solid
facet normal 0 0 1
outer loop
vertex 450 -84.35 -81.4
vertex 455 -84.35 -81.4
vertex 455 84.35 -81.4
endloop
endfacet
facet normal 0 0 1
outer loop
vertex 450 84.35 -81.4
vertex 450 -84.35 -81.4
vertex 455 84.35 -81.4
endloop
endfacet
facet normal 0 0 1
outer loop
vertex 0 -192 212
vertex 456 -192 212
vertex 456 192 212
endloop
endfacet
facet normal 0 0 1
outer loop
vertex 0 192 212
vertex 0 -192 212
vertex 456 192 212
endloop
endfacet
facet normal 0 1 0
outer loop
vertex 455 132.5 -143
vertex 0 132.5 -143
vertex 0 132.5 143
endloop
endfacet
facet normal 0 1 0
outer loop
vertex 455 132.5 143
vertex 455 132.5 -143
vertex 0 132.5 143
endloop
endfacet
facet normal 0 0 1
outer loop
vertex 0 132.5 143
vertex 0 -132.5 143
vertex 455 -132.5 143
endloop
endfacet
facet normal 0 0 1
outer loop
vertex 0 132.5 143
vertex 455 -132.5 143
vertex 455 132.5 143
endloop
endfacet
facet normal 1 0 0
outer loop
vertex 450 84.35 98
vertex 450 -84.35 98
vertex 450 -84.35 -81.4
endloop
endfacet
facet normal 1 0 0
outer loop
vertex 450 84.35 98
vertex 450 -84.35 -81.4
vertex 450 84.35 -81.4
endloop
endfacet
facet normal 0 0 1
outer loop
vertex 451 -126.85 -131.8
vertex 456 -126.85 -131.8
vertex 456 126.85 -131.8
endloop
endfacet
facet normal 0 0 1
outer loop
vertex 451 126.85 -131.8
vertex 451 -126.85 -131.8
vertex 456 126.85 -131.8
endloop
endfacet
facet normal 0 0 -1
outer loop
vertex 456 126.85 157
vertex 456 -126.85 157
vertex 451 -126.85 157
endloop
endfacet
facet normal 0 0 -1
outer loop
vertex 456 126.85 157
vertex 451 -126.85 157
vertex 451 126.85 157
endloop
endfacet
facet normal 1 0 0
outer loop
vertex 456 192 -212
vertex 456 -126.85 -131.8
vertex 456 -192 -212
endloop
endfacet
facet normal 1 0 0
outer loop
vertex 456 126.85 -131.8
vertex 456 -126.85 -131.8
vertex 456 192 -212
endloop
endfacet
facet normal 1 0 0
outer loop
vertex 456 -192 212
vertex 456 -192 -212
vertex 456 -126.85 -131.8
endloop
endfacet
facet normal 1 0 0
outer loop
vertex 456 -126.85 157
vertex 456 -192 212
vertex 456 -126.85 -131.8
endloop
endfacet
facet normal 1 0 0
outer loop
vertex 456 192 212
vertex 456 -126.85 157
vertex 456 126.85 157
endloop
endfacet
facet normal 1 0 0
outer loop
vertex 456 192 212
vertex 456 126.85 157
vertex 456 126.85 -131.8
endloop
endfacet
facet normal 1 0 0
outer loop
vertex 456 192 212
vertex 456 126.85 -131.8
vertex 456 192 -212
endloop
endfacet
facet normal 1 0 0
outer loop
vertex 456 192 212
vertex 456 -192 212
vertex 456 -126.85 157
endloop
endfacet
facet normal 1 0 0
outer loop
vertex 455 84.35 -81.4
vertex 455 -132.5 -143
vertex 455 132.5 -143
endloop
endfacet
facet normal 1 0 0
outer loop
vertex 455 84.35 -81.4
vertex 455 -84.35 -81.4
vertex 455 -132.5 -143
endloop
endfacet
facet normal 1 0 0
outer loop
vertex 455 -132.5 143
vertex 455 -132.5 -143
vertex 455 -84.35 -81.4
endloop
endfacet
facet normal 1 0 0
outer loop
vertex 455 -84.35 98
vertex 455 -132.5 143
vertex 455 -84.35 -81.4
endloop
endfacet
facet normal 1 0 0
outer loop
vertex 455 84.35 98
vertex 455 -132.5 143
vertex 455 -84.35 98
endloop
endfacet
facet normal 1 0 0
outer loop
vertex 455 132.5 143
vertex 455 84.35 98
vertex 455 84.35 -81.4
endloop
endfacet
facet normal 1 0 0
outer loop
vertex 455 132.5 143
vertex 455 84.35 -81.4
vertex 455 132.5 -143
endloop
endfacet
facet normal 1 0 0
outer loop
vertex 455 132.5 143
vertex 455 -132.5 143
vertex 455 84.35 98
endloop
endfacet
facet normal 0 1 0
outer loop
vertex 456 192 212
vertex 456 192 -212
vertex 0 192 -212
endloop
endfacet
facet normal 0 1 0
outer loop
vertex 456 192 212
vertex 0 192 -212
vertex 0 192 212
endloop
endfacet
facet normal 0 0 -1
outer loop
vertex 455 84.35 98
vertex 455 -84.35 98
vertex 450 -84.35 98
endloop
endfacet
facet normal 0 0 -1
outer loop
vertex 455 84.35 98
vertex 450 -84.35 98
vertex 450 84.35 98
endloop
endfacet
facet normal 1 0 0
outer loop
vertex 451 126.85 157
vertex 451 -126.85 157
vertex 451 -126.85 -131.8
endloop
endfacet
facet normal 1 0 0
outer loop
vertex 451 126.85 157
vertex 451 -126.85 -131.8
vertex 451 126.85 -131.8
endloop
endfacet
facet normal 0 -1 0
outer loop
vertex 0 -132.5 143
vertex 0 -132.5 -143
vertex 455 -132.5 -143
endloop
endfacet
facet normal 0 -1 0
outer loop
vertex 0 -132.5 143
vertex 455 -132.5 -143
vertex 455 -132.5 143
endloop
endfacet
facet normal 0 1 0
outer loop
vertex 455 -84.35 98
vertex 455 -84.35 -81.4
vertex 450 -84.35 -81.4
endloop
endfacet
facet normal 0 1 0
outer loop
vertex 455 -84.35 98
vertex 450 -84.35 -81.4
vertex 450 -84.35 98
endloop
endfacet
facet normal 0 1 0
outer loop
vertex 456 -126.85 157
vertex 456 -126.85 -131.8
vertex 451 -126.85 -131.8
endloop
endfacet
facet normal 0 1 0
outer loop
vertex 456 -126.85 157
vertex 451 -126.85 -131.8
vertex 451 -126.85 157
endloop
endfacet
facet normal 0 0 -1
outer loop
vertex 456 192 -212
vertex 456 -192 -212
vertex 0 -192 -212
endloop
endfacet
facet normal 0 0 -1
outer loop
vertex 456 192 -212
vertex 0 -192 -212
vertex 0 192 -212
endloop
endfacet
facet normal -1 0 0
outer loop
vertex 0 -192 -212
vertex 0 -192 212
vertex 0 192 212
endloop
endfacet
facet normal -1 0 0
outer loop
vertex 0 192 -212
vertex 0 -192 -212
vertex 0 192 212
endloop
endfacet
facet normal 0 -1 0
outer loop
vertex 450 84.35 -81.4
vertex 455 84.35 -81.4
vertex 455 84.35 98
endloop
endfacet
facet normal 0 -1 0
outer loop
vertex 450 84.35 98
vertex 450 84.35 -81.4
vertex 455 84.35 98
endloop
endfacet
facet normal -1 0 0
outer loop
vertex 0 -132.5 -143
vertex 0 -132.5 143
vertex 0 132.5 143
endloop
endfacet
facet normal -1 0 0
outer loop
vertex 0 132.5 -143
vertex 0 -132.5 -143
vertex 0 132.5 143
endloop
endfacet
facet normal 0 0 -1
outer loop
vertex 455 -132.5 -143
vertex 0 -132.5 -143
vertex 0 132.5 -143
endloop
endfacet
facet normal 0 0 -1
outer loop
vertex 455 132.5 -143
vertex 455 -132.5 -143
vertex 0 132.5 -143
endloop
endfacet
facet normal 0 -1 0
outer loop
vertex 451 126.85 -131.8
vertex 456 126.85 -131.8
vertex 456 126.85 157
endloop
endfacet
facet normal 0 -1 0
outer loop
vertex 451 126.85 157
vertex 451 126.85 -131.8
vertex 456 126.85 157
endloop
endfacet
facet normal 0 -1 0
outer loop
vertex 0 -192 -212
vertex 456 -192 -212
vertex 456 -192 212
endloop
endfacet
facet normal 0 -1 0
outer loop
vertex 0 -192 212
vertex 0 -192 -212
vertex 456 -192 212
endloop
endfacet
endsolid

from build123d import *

# Parameters (mm, degrees)
F0_W     = 265
F0_H     = 286
F1_DEPTH = 455
F2_W     = 168.7
F2_H     = 179.4
F3_DEPTH = 5
F4_W     = 384
F4_H     = 424
F5_DEPTH = 456
F6_W     = 253.7
F6_H     = 288.8
F7_DEPTH = 5


with BuildPart() as f1:
    # F0 (on Right) → F1 (new body)
    with BuildSketch(Plane.YZ):
        Rectangle(F0_W, F0_H)
    extrude(amount=F1_DEPTH)

    # F2 (on face) → F3 (cut)
    with BuildSketch(Plane.YZ.offset(455)):
        with Locations((0, 8.3)):
            Rectangle(F2_W, F2_H)
    extrude(amount=-F3_DEPTH, mode=Mode.SUBTRACT)


with BuildPart() as f5:
    # F4 (on Right) → F5 (new body)
    with BuildSketch(Plane.YZ):
        Rectangle(F4_W, F4_H)
    extrude(amount=F5_DEPTH)

    # F6 (on face) → F7 (cut)
    with BuildSketch(Plane.YZ.offset(456)):
        with Locations((0, 12.6)):
            Rectangle(F6_W, F6_H)
    extrude(amount=-F7_DEPTH, mode=Mode.SUBTRACT)


solid = Compound([f1.part, f5.part])
